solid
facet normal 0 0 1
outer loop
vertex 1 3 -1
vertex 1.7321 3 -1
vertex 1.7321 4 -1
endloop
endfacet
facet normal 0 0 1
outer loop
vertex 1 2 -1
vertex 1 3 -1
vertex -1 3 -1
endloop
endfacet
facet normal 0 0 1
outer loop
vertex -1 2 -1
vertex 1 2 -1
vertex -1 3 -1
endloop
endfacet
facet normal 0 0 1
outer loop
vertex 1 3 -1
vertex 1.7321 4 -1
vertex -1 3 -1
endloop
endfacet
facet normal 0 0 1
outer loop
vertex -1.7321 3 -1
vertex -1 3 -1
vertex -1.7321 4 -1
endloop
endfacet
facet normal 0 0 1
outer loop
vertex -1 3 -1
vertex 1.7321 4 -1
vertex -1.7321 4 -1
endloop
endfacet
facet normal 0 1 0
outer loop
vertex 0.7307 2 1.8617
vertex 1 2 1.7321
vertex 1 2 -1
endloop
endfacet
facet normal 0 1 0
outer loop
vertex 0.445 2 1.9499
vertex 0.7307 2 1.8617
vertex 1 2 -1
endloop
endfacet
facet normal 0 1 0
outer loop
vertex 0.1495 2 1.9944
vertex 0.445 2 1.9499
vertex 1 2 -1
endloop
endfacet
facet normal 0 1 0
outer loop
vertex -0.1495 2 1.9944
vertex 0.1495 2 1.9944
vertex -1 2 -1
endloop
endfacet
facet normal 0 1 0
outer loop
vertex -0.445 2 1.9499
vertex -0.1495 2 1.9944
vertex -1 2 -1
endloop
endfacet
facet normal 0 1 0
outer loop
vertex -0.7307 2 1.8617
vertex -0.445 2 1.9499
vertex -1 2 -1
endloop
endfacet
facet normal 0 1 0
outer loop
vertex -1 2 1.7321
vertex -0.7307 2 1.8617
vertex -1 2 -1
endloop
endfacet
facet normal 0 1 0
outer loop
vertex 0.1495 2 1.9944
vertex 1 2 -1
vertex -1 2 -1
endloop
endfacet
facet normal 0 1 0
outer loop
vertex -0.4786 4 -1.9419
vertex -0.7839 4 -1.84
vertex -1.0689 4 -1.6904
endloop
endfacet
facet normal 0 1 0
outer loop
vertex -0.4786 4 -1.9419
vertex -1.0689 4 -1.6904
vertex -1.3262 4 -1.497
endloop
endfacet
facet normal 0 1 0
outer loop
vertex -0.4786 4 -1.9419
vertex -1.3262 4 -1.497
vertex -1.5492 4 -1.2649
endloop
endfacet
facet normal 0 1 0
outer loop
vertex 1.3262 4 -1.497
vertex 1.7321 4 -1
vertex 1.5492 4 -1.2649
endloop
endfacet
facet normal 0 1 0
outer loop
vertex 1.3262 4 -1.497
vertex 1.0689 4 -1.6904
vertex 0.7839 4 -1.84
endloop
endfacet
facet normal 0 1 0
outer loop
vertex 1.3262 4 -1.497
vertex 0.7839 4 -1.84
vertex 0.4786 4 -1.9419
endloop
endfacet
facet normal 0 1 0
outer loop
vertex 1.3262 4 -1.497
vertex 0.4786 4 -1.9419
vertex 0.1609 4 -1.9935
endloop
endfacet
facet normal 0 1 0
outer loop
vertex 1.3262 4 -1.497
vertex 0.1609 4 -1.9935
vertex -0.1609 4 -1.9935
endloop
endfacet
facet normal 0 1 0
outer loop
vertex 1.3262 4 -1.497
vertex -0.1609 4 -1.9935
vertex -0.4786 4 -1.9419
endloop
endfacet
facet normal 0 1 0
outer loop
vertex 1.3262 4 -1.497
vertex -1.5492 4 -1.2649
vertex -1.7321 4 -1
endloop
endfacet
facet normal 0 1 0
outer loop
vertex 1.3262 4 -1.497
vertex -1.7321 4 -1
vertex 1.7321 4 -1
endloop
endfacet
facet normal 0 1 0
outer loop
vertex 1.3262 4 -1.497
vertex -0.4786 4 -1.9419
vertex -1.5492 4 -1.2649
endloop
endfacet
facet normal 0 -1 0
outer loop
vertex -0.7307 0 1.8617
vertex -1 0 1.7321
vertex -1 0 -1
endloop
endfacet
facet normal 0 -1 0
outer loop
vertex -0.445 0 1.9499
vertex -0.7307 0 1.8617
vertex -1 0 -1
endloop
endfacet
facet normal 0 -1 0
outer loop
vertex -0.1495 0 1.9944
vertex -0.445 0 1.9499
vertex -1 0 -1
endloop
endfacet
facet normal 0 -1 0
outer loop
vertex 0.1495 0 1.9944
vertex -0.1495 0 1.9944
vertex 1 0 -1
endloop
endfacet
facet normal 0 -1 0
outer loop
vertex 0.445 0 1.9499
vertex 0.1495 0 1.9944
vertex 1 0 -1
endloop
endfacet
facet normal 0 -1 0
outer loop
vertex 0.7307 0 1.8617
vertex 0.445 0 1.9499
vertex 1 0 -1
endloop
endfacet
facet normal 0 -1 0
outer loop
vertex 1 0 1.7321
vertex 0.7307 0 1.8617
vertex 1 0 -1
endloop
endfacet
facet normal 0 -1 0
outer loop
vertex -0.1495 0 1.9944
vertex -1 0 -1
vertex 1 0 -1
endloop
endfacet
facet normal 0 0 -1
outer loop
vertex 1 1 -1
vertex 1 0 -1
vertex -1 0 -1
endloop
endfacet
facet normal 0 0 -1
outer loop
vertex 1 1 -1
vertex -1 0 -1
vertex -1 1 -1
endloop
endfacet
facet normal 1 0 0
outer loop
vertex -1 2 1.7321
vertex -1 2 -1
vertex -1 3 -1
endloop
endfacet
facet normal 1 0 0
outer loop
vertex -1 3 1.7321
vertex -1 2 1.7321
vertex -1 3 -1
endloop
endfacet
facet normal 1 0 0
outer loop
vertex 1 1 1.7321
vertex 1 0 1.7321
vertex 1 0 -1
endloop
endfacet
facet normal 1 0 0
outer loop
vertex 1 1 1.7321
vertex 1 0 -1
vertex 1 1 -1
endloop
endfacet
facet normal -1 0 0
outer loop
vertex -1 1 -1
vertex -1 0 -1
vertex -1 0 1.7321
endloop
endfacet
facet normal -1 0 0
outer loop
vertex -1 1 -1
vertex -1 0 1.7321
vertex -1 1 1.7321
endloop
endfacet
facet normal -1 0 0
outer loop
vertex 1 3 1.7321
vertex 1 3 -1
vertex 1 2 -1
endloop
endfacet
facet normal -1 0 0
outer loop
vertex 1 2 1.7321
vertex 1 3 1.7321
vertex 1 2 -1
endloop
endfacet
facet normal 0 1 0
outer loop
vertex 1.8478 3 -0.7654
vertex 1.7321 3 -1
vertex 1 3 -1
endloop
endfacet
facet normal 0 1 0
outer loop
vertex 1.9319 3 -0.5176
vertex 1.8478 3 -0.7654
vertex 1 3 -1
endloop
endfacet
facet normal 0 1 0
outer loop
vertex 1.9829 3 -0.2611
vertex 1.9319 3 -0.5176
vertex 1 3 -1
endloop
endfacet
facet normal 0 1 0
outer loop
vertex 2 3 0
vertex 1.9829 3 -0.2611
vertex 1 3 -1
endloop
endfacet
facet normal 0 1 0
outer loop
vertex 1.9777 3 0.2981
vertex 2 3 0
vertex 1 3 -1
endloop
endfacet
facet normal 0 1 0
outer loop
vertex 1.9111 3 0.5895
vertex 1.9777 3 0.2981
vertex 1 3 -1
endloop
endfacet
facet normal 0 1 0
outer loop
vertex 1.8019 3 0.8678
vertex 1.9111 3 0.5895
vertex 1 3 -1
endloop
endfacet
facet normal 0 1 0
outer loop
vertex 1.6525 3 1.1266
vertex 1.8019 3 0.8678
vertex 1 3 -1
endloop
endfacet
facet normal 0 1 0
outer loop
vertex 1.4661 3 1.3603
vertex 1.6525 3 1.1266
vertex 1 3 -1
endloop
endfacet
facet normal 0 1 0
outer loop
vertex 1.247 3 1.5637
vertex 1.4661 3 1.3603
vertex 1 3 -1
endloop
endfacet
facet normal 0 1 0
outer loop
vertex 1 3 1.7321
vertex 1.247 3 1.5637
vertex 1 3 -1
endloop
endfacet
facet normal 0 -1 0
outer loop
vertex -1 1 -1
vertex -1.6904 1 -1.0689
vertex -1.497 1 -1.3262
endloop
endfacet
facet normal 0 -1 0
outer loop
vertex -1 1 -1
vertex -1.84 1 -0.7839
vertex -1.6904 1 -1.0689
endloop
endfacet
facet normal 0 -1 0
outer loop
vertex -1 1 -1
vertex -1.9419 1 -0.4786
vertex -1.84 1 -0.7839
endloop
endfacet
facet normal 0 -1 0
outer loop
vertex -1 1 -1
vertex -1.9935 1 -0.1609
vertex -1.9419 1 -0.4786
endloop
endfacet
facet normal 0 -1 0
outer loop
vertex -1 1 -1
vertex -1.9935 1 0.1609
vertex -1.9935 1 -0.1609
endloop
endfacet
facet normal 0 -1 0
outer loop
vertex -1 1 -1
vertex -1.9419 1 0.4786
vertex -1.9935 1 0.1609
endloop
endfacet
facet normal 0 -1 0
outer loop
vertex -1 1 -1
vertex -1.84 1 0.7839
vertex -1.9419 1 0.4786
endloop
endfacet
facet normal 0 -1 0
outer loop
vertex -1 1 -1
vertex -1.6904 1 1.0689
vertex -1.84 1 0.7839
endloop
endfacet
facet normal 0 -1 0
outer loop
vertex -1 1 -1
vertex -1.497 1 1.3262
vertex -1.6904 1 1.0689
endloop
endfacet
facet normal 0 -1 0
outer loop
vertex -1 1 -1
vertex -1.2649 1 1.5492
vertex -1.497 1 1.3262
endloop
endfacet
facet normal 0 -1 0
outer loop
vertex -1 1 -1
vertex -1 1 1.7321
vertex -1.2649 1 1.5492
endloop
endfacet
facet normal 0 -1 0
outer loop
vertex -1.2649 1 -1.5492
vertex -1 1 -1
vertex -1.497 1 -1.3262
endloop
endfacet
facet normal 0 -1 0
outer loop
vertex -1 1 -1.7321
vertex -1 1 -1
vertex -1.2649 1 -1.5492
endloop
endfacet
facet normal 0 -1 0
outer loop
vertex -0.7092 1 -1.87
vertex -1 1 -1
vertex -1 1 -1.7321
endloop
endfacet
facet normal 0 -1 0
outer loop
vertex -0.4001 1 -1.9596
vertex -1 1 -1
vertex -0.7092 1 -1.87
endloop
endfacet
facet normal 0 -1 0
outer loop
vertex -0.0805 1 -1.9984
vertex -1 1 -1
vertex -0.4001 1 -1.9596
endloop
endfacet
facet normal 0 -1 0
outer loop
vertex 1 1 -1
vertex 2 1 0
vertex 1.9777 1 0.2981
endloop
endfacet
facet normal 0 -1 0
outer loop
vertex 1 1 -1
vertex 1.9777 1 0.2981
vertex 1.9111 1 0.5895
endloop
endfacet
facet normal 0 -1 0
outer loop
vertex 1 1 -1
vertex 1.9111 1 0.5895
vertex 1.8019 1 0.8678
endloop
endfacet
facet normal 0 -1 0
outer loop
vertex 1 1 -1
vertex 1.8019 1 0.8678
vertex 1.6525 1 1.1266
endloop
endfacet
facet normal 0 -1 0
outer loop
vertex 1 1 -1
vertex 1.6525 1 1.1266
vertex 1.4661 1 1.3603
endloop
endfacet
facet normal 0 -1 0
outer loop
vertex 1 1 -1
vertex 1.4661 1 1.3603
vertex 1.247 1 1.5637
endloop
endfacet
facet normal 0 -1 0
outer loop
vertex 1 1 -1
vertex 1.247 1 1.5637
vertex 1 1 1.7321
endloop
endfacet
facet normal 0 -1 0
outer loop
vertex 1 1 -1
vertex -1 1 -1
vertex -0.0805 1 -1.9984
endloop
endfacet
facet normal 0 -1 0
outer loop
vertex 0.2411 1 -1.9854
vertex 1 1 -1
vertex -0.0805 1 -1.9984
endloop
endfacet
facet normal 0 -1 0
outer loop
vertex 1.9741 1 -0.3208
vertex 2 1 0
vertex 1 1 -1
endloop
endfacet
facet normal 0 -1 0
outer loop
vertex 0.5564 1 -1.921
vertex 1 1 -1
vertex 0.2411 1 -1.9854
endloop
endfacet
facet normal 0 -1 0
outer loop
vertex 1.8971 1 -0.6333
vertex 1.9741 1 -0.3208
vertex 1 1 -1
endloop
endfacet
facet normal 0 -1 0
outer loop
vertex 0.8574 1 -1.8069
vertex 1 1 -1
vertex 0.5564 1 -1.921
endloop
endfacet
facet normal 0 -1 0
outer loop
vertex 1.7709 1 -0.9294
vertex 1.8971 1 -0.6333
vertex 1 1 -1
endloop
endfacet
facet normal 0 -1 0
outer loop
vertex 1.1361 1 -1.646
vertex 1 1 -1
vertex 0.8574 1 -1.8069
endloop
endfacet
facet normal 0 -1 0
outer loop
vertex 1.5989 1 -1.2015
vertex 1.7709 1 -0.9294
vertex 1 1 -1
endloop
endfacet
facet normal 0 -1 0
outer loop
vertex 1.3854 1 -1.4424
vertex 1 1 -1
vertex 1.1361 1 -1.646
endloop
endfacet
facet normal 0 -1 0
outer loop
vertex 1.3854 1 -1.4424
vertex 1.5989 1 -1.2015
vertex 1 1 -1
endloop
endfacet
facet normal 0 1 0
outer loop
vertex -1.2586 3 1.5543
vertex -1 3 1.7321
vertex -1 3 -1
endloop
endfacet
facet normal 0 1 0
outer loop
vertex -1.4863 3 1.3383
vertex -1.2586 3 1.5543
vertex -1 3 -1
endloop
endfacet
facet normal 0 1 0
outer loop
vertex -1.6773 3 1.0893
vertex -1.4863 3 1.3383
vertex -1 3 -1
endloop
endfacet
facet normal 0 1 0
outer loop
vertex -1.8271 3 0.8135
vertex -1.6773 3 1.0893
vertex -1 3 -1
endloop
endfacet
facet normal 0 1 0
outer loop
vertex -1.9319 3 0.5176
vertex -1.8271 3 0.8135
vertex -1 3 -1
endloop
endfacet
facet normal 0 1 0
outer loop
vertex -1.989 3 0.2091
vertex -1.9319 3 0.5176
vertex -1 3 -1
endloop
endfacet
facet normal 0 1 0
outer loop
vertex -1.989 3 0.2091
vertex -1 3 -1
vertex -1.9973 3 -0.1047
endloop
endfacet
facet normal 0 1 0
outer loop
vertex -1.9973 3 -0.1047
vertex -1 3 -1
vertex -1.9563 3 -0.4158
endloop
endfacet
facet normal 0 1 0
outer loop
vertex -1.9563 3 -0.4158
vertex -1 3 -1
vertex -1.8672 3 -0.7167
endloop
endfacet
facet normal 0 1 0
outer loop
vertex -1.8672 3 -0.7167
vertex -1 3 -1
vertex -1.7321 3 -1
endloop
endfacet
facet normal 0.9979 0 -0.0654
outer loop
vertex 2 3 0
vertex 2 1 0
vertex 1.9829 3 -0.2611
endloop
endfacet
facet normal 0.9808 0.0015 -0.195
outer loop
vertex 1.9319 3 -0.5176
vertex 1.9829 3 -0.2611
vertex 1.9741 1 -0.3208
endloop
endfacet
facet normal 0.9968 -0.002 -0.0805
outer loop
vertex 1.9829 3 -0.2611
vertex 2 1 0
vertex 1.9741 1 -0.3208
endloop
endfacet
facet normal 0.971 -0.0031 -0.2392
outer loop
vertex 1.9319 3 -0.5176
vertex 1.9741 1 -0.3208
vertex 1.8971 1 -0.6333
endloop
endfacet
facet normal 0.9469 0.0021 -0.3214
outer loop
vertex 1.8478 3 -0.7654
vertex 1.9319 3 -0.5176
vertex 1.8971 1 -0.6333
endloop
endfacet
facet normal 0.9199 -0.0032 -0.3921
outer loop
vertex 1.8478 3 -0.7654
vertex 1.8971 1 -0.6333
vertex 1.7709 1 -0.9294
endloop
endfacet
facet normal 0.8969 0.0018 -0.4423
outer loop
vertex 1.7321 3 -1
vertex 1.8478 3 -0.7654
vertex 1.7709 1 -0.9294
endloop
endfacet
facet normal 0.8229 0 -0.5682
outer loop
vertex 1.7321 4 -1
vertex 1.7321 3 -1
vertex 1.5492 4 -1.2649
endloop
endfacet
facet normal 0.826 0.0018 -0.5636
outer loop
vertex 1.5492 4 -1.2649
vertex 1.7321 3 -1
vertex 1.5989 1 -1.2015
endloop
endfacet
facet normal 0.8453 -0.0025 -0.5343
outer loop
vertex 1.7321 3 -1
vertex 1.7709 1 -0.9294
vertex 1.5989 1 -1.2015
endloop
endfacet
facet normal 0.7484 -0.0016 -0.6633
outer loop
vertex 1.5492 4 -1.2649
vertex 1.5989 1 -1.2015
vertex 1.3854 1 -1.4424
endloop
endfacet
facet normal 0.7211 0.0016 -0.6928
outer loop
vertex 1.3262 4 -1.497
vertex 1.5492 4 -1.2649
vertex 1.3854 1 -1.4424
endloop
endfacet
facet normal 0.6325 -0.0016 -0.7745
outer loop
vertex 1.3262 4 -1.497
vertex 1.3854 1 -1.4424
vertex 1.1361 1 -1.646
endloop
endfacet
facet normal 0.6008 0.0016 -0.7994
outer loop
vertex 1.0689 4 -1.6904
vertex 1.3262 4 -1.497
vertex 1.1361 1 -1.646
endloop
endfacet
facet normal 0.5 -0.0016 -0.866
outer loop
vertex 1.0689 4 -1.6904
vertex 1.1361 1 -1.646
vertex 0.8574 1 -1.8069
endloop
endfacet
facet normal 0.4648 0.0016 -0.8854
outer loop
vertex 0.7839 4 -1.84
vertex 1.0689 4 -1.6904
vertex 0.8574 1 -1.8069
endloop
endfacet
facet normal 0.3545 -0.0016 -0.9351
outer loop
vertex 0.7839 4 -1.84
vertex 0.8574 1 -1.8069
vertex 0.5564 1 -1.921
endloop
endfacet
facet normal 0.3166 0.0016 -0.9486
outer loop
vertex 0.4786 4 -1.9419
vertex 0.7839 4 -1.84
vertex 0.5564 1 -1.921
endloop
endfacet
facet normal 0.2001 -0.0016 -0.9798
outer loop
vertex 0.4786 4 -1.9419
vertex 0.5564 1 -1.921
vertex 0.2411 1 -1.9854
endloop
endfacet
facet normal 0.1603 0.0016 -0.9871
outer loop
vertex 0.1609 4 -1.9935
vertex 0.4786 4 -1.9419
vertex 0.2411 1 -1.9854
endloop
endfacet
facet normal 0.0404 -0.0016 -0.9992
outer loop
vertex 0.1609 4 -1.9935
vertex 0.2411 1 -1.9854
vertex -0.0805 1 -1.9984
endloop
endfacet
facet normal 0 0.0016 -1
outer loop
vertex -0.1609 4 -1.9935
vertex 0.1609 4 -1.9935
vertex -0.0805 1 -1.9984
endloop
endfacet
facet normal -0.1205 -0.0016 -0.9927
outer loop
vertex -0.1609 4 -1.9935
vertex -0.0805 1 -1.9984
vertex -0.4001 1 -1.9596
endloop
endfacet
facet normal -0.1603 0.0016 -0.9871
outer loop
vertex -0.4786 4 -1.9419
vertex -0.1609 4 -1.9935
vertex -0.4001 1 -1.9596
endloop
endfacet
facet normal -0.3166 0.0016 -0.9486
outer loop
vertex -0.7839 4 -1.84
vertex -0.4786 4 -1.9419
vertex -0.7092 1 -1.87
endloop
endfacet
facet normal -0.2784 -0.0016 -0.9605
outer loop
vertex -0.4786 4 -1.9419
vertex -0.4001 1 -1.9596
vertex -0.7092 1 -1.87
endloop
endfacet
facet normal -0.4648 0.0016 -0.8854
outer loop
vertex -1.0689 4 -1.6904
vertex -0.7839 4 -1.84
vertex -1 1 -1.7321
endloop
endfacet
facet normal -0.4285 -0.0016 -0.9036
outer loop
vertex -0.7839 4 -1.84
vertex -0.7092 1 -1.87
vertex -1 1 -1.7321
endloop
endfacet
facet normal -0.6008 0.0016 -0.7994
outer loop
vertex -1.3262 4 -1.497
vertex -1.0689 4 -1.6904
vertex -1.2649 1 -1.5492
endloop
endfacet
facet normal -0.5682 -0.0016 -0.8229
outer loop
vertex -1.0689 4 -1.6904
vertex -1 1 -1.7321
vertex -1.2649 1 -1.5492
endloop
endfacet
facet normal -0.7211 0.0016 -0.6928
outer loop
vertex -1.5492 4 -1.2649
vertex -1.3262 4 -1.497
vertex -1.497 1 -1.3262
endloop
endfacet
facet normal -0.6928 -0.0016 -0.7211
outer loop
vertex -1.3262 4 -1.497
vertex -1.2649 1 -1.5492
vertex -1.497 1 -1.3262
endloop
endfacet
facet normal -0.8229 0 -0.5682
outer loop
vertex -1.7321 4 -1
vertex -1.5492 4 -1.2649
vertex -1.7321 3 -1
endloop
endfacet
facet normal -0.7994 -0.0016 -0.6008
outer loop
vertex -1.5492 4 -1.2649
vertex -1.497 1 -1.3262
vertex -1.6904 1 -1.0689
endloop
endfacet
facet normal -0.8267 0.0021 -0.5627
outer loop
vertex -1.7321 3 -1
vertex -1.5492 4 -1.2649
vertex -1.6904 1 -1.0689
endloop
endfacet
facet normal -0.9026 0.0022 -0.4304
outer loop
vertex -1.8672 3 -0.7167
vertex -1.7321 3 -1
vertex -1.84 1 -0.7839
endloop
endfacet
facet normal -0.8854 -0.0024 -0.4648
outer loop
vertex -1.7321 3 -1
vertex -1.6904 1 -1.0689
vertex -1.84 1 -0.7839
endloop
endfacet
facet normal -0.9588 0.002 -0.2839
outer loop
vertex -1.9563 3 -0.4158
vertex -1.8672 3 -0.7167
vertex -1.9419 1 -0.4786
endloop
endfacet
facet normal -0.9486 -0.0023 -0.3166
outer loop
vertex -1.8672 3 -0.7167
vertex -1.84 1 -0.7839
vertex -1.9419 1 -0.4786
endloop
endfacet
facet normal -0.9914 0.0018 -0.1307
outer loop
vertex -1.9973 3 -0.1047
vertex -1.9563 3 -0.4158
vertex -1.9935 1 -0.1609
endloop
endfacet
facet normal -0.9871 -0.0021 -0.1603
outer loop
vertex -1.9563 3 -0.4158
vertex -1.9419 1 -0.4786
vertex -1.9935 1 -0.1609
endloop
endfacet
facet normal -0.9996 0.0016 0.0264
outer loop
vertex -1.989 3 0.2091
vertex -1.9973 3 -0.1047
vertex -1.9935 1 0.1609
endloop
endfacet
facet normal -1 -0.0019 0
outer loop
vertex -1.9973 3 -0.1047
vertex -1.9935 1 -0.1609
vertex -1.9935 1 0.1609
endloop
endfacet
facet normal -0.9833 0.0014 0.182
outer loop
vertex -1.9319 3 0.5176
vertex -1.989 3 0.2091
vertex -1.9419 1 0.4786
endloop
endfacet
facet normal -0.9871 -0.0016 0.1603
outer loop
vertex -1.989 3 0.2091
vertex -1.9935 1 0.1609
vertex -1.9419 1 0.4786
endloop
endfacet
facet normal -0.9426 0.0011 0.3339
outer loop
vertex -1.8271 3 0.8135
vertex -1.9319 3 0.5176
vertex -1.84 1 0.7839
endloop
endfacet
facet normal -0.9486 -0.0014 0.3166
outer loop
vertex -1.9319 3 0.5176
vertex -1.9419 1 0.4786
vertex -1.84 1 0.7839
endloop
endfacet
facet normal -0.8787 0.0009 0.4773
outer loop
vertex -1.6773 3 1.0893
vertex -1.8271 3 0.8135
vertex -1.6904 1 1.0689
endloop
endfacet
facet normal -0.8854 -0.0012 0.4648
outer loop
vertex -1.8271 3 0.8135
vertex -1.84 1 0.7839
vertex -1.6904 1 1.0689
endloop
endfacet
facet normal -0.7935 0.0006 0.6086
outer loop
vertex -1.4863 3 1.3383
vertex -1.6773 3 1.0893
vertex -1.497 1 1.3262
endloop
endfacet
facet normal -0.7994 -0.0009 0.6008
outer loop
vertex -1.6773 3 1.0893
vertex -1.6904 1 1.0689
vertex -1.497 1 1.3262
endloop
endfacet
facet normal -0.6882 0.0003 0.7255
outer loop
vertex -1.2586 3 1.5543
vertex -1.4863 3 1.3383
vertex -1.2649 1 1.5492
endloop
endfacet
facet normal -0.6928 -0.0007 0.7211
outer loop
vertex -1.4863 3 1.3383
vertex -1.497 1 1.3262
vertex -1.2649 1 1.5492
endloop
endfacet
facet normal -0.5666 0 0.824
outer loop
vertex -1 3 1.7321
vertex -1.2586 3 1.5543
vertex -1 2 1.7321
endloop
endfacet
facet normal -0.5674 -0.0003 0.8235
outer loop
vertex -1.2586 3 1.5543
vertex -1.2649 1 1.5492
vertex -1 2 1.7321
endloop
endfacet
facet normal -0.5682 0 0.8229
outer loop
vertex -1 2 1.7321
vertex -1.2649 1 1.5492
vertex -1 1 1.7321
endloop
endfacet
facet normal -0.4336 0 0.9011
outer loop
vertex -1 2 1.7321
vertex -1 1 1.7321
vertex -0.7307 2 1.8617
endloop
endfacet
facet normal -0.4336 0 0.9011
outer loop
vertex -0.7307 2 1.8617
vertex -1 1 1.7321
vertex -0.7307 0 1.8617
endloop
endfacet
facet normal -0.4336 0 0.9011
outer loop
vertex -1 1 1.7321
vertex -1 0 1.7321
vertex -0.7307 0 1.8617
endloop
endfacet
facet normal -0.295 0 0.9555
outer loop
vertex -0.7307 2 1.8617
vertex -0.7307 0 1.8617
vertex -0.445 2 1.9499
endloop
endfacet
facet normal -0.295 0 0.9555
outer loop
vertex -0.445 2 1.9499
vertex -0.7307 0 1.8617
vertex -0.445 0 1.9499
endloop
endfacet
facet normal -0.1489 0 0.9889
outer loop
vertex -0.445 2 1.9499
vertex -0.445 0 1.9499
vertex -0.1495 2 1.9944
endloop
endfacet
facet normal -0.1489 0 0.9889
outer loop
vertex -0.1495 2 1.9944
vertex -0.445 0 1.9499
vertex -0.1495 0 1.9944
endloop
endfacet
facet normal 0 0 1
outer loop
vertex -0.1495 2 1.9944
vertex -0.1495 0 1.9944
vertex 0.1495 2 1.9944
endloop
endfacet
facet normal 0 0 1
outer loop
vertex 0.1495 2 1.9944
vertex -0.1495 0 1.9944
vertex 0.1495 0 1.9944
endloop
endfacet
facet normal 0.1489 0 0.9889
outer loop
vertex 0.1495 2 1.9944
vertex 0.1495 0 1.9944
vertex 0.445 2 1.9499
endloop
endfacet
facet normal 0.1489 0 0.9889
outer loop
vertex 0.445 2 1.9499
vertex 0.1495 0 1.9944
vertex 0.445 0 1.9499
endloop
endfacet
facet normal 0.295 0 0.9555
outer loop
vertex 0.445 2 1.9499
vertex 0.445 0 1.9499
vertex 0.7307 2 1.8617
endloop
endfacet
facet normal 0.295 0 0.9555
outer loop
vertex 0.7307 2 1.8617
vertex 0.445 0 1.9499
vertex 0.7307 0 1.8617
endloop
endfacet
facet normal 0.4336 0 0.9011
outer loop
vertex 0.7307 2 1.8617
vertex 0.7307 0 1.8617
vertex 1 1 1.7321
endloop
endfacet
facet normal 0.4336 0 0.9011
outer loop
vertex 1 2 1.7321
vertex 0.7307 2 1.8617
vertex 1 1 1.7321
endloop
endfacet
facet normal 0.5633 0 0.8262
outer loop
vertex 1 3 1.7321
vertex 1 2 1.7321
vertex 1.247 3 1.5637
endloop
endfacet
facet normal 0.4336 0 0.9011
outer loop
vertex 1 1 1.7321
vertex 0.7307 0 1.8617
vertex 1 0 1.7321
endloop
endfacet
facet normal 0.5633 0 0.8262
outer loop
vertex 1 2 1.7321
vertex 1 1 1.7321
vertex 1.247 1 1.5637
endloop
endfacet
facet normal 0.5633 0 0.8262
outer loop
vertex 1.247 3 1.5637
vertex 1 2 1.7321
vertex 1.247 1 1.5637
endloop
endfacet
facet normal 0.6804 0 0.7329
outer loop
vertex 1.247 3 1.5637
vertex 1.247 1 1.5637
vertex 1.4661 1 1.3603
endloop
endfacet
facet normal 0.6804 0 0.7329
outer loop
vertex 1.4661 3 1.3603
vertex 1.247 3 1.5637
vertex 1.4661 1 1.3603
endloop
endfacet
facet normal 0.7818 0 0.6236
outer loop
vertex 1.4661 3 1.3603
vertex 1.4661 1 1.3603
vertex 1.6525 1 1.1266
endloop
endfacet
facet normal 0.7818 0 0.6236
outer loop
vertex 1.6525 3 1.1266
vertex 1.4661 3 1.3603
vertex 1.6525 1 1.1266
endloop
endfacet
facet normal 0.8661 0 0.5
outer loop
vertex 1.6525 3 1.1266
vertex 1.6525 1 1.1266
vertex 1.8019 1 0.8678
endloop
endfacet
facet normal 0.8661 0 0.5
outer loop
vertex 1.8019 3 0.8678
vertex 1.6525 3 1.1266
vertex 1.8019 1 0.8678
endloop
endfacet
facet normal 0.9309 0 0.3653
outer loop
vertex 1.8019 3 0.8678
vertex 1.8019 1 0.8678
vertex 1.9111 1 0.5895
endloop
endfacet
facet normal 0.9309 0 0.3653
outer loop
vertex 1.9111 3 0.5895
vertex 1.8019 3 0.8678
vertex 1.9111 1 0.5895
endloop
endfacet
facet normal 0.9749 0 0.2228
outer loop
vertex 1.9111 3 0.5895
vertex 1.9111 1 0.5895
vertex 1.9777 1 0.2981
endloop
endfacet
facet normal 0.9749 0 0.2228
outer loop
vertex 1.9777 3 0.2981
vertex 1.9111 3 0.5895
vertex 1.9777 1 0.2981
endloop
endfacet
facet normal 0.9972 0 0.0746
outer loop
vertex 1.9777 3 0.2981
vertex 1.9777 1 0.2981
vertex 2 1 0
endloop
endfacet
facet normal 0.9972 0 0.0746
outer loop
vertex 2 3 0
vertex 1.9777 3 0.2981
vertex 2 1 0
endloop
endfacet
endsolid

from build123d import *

# Parameters (mm, degrees)
SKETCH1_R               = 2
BOSS_EXTRUDE1_DEPTH     = 4
SKETCH2_W               = 1
SKETCH2_H               = 1
CUT_EXTRUDE1_DEPTH      = 2
CUT_EXTRUDE2_DEPTH      = 4
CUT_EXTRUDE2_DEPTH_BACK = 1
SKETCH4_W               = 1
SKETCH4_H               = 1
CUT_EXTRUDE3_DEPTH      = 5


with BuildPart() as part:
    # Sketch1 → Boss-Extrude1 (new body)
    with BuildSketch(Plane(origin=(0, 0, 0), x_dir=(1, 0, 0), z_dir=(0, 1, 0))):
        Circle(SKETCH1_R)
    extrude(amount=BOSS_EXTRUDE1_DEPTH)

    # Sketch2 → Cut-Extrude1 (cut, symmetric)
    with BuildSketch(Plane.XY):
        with Locations((-1.5, 0.5)):
            Rectangle(SKETCH2_W, SKETCH2_H)
        with Locations((1.5, 0.5)):
            Rectangle(SKETCH2_W, SKETCH2_H)
    extrude(amount=CUT_EXTRUDE1_DEPTH, both=True, mode=Mode.SUBTRACT)

    # Sketch3 → Cut-Extrude2 (cut, two sides)
    with BuildSketch(Plane.XY) as cut_extrude2_sk:
        Polygon((-2, 4), (2, 4), (2, 3), (1, 3), (1, 2), (-1, 2), (-1, 3), (-2, 3), align=None)
    extrude(amount=CUT_EXTRUDE2_DEPTH, mode=Mode.SUBTRACT)
    extrude(cut_extrude2_sk.sketch, amount=-CUT_EXTRUDE2_DEPTH_BACK, mode=Mode.SUBTRACT)

    # Sketch4 → Cut-Extrude3 (cut, symmetric)
    with BuildSketch(Plane(origin=(0, 0, 0), x_dir=(0, 0, -1), z_dir=(1, 0, 0))):
        with Locations((1.5, 0.5)):
            Rectangle(SKETCH4_W, SKETCH4_H)
    extrude(amount=CUT_EXTRUDE3_DEPTH, both=True, mode=Mode.SUBTRACT)


solid = part.part
